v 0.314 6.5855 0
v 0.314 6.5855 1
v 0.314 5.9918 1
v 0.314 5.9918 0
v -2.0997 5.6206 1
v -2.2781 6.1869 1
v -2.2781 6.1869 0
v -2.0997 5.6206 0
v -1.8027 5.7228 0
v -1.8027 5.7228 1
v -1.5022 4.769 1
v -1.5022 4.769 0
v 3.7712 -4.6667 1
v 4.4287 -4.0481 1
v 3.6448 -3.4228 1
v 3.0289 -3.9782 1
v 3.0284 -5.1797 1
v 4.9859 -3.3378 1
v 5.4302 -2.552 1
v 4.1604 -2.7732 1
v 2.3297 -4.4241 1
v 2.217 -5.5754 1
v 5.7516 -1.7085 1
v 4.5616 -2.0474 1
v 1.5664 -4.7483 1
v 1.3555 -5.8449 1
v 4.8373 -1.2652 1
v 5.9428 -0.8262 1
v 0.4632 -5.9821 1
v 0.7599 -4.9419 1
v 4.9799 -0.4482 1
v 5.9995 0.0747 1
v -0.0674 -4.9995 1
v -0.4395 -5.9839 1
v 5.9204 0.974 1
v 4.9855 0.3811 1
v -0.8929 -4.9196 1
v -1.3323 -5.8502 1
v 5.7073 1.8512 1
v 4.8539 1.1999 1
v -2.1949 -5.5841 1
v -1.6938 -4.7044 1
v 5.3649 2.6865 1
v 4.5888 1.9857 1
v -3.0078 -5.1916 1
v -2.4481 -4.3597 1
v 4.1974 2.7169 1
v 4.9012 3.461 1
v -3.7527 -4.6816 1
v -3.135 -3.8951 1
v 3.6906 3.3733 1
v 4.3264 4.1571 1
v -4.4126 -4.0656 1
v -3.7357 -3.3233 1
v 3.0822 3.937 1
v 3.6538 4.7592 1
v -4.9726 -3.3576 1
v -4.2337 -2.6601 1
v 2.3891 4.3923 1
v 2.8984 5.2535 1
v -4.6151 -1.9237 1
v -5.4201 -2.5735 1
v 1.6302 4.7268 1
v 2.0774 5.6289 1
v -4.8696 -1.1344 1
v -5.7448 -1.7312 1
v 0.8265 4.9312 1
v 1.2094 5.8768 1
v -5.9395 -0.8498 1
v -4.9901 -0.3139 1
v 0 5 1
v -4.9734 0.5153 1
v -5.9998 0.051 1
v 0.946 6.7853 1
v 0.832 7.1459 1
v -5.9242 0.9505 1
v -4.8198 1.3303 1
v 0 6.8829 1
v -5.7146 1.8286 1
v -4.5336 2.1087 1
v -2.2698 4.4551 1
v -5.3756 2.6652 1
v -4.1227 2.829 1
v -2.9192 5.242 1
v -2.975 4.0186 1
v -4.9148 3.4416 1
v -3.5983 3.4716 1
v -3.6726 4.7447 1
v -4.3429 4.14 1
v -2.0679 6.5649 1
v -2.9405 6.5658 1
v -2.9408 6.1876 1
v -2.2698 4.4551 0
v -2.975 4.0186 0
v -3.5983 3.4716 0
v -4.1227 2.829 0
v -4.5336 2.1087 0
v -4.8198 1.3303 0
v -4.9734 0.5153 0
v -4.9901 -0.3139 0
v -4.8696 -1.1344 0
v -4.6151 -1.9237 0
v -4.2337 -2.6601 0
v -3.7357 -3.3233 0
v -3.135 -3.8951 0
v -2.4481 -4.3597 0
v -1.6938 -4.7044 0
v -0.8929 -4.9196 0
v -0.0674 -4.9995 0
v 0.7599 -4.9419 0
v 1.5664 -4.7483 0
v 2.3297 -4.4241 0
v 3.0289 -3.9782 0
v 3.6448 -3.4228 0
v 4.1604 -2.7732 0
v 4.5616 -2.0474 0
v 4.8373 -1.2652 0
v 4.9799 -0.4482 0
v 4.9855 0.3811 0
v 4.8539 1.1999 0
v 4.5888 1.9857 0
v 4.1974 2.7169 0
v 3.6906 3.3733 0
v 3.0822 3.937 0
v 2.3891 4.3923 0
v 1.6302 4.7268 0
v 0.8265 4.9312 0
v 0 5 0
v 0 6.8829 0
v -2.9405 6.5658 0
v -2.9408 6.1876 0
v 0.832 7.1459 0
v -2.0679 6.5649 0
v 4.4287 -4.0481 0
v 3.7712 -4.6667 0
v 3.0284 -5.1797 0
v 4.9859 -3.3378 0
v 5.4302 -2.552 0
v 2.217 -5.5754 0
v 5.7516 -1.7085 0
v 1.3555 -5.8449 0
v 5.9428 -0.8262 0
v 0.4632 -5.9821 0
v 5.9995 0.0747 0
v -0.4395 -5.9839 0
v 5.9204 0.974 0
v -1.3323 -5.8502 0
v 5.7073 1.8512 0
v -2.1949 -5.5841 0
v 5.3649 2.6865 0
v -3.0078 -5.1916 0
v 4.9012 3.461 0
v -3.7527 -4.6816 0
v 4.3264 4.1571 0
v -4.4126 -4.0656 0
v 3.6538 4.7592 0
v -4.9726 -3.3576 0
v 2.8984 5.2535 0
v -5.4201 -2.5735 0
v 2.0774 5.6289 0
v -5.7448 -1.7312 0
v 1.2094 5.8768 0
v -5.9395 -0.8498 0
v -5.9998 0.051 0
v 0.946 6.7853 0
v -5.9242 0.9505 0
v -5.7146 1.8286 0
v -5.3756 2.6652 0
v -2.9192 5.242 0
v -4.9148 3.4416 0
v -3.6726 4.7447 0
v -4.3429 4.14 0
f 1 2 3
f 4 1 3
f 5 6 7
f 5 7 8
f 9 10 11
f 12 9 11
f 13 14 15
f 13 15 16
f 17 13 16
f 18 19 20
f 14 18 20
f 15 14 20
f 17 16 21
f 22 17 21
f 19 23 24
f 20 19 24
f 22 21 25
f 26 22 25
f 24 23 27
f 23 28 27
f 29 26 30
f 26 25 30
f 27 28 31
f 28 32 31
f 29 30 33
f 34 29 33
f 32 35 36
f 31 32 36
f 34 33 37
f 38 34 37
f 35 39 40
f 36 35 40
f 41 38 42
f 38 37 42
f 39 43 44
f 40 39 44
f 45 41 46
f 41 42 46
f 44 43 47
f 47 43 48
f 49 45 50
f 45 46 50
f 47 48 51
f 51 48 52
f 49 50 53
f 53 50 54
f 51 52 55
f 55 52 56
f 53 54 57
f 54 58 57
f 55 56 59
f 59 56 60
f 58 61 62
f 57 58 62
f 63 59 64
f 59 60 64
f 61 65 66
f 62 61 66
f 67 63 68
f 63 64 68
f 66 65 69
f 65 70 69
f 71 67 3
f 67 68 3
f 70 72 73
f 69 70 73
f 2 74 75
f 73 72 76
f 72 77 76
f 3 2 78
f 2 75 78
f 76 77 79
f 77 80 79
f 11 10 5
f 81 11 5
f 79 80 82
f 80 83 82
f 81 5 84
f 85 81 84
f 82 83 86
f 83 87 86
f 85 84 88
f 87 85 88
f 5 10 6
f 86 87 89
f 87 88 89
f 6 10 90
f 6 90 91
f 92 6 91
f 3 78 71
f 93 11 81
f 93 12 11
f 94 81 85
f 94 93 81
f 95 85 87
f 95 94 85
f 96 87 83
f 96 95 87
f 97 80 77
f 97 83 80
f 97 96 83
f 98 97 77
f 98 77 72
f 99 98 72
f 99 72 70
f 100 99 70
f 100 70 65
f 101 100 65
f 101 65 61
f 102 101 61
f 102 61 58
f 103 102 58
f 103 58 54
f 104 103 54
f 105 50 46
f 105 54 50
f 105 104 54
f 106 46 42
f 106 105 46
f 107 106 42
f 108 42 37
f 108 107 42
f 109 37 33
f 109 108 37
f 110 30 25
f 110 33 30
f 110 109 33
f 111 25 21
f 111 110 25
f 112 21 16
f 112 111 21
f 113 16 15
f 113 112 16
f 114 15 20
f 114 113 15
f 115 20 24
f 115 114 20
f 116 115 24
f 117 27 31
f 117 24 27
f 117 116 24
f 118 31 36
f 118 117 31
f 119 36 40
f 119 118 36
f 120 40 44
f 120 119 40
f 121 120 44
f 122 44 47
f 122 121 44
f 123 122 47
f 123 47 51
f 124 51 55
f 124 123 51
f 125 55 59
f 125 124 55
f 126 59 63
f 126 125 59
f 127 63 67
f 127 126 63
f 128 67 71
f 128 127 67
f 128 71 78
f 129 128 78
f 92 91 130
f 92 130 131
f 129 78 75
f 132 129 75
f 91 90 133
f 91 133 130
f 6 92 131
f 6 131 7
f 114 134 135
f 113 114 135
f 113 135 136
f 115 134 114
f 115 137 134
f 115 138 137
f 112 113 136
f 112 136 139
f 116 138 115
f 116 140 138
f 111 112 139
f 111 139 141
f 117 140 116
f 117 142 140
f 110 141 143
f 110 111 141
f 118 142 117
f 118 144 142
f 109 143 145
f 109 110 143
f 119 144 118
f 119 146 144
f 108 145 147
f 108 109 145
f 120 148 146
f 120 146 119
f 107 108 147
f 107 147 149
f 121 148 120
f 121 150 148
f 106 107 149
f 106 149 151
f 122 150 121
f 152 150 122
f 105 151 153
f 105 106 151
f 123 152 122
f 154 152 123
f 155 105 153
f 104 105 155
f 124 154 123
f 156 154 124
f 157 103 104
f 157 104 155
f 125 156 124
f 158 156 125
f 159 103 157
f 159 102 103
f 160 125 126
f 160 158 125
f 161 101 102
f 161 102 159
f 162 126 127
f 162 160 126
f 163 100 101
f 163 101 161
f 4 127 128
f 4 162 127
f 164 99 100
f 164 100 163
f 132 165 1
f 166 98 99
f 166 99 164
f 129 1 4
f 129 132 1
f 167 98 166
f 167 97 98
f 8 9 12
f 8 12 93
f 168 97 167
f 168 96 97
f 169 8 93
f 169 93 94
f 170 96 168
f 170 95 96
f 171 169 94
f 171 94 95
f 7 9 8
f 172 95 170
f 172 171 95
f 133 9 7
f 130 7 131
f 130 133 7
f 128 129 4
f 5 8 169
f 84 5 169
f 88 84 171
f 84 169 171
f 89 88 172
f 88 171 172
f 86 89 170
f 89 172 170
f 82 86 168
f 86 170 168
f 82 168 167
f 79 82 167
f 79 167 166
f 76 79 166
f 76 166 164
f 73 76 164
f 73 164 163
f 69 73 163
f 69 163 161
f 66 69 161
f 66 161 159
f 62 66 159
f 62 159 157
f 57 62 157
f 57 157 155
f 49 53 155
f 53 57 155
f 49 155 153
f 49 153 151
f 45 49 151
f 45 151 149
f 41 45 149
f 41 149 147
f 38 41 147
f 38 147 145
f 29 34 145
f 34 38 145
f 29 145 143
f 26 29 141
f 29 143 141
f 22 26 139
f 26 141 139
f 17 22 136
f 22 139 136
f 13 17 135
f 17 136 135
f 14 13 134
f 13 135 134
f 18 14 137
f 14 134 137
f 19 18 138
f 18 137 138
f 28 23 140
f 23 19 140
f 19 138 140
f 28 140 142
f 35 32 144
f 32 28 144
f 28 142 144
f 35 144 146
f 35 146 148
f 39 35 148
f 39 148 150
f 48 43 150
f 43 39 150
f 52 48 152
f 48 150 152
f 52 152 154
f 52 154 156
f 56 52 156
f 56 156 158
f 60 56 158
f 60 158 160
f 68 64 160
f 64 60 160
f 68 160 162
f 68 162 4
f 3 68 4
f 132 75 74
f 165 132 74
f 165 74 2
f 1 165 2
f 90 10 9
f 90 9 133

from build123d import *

# Parameters (mm, degrees)
SKETCH_1_R          = 6
SKETCH_1_R_2        = 5
EXTRUDE_1_DEPTH     = 1
CUT_EXTRUDE_1_DEPTH = 1
EXTRUDE_2_DEPTH     = 1


with BuildPart() as part:
    # 草图1 → 凸台-拉伸1 (new body)
    with BuildSketch(Plane.XY):
        Circle(SKETCH_1_R)
        Circle(SKETCH_1_R_2, mode=Mode.SUBTRACT)
    extrude(amount=EXTRUDE_1_DEPTH)

    # 草图2 → 切除-拉伸1 (cut)
    with BuildSketch(Plane.XY.offset(1)):
        Polygon((0, 0), (0, 9.552056019), (-2.79719818, 8.880094398), align=None)
    extrude(amount=-CUT_EXTRUDE_1_DEPTH, mode=Mode.SUBTRACT)

    # 草图3 → 凸台-拉伸2 (add)
    with BuildSketch(Plane.XY.offset(1)):
        Polygon((0, 6), (0, 6.882885988), (0.831959966, 7.145879705), (0.94595308, 6.785271442), (0.314049211, 6.585518144), (0.314049211, 5.991775454), align=None)
        Polygon((-2.099729946, 5.620599092), (-1.80266094, 5.722797702), (-2.067918288, 6.564894019), (-2.940456135, 6.56578037), (-2.940840318, 6.187583858), (-2.278116072, 6.186910643), align=None)
    extrude(amount=-EXTRUDE_2_DEPTH)


solid = part.part
